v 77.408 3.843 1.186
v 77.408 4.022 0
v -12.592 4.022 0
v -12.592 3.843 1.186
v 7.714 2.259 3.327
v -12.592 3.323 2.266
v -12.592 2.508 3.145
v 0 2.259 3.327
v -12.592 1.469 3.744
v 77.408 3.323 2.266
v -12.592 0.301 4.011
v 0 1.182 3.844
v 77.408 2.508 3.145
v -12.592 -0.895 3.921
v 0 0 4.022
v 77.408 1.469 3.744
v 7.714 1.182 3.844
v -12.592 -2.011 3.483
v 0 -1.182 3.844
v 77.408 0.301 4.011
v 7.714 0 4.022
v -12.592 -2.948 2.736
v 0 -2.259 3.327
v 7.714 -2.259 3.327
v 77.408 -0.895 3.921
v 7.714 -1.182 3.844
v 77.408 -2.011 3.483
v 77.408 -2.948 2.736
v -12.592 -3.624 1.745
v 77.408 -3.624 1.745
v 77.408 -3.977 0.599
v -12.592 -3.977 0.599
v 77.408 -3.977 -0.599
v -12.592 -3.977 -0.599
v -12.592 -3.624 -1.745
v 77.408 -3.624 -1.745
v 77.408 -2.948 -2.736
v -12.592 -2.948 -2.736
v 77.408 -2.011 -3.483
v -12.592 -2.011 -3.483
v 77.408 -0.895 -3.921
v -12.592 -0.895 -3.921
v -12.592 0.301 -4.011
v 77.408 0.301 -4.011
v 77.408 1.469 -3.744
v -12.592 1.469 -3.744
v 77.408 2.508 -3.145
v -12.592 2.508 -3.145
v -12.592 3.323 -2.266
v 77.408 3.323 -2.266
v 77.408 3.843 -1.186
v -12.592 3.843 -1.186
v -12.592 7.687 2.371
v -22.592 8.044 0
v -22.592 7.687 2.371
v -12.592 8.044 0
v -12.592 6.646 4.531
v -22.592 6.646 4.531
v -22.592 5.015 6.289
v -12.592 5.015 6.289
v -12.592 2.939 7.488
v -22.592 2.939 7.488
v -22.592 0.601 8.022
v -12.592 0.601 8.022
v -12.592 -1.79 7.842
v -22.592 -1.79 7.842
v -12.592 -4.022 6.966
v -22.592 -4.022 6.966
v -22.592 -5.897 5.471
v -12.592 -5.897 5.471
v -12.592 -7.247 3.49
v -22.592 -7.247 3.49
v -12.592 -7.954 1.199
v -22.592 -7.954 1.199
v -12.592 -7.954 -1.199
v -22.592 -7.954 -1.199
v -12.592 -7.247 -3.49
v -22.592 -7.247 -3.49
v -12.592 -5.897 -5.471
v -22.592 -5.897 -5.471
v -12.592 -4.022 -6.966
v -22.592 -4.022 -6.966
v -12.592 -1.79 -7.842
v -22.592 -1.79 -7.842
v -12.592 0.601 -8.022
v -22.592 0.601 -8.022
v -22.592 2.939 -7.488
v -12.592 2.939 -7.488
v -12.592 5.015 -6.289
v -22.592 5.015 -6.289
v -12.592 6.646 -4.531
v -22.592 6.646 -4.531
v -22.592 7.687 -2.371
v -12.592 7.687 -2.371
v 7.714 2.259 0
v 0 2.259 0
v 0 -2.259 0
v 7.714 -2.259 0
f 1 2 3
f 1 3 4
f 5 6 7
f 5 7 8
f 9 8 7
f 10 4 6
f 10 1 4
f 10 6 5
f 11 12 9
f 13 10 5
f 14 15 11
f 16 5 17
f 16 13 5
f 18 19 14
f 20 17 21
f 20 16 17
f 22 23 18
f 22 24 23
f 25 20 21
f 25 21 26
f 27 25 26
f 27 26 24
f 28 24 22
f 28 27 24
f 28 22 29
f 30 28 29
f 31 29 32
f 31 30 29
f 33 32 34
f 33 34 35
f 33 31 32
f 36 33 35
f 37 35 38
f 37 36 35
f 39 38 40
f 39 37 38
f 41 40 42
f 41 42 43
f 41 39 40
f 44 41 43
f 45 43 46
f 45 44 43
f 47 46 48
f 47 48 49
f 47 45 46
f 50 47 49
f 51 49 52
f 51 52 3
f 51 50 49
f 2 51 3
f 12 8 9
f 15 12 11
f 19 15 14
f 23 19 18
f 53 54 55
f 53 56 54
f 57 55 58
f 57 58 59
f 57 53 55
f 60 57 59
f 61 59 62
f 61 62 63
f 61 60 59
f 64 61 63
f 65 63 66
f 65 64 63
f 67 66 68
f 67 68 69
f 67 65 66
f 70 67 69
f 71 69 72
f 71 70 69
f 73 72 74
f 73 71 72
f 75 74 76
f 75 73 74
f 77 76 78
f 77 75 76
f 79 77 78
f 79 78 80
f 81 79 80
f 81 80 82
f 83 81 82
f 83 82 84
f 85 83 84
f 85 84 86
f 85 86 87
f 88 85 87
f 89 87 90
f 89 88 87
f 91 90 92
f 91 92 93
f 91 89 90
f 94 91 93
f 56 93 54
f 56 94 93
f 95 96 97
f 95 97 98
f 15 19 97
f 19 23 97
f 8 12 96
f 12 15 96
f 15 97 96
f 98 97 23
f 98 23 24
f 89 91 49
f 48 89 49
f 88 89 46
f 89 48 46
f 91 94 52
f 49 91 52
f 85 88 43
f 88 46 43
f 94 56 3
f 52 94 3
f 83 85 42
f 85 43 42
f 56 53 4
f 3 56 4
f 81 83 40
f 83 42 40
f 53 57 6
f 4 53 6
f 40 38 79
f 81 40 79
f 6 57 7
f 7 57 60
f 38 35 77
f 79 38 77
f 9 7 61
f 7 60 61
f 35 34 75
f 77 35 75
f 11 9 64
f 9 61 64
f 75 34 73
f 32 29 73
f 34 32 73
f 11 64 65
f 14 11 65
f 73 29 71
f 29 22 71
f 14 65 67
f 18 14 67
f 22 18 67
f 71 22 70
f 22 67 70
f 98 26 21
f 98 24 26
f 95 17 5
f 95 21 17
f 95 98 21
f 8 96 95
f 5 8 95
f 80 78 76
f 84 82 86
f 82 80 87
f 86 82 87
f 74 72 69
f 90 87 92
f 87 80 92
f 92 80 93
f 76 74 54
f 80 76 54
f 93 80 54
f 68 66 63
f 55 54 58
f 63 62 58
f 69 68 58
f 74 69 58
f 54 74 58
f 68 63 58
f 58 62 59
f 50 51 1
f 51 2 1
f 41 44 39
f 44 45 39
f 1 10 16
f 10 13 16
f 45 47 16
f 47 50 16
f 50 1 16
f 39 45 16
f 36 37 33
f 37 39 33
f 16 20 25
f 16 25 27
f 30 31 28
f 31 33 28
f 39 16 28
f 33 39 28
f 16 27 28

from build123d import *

# Parameters (mm, degrees)
F0_W     = 10
F0_H     = 4.0220445953
F0_W_2   = 90
F2_W     = 7.713583298
F2_H     = 4.518811591
F3_DEPTH = 10


with BuildPart() as f1:
    # F0 (on Top) → F1 (revolve)
    with BuildSketch(Plane.XY):
        with Locations((-17.5921608508, 6.033066893)):
            Rectangle(F0_W, F0_H)
        with Locations((-17.5921608508, 2.0110222977)):
            Rectangle(F0_W, F0_H)
        with Locations((32.4078391492, 2.0110222977)):
            Rectangle(F0_W_2, F0_H)
    revolve(axis=Axis((14.6210342646, 0, 0), (1, 0, 0)))

    # F2 (on Top) → F3 (cut)
    with BuildSketch(Plane.XY):
        with Locations((3.856791649, 0)):
            Rectangle(F2_W, F2_H)
    extrude(amount=F3_DEPTH, mode=Mode.SUBTRACT)


solid = f1.part
